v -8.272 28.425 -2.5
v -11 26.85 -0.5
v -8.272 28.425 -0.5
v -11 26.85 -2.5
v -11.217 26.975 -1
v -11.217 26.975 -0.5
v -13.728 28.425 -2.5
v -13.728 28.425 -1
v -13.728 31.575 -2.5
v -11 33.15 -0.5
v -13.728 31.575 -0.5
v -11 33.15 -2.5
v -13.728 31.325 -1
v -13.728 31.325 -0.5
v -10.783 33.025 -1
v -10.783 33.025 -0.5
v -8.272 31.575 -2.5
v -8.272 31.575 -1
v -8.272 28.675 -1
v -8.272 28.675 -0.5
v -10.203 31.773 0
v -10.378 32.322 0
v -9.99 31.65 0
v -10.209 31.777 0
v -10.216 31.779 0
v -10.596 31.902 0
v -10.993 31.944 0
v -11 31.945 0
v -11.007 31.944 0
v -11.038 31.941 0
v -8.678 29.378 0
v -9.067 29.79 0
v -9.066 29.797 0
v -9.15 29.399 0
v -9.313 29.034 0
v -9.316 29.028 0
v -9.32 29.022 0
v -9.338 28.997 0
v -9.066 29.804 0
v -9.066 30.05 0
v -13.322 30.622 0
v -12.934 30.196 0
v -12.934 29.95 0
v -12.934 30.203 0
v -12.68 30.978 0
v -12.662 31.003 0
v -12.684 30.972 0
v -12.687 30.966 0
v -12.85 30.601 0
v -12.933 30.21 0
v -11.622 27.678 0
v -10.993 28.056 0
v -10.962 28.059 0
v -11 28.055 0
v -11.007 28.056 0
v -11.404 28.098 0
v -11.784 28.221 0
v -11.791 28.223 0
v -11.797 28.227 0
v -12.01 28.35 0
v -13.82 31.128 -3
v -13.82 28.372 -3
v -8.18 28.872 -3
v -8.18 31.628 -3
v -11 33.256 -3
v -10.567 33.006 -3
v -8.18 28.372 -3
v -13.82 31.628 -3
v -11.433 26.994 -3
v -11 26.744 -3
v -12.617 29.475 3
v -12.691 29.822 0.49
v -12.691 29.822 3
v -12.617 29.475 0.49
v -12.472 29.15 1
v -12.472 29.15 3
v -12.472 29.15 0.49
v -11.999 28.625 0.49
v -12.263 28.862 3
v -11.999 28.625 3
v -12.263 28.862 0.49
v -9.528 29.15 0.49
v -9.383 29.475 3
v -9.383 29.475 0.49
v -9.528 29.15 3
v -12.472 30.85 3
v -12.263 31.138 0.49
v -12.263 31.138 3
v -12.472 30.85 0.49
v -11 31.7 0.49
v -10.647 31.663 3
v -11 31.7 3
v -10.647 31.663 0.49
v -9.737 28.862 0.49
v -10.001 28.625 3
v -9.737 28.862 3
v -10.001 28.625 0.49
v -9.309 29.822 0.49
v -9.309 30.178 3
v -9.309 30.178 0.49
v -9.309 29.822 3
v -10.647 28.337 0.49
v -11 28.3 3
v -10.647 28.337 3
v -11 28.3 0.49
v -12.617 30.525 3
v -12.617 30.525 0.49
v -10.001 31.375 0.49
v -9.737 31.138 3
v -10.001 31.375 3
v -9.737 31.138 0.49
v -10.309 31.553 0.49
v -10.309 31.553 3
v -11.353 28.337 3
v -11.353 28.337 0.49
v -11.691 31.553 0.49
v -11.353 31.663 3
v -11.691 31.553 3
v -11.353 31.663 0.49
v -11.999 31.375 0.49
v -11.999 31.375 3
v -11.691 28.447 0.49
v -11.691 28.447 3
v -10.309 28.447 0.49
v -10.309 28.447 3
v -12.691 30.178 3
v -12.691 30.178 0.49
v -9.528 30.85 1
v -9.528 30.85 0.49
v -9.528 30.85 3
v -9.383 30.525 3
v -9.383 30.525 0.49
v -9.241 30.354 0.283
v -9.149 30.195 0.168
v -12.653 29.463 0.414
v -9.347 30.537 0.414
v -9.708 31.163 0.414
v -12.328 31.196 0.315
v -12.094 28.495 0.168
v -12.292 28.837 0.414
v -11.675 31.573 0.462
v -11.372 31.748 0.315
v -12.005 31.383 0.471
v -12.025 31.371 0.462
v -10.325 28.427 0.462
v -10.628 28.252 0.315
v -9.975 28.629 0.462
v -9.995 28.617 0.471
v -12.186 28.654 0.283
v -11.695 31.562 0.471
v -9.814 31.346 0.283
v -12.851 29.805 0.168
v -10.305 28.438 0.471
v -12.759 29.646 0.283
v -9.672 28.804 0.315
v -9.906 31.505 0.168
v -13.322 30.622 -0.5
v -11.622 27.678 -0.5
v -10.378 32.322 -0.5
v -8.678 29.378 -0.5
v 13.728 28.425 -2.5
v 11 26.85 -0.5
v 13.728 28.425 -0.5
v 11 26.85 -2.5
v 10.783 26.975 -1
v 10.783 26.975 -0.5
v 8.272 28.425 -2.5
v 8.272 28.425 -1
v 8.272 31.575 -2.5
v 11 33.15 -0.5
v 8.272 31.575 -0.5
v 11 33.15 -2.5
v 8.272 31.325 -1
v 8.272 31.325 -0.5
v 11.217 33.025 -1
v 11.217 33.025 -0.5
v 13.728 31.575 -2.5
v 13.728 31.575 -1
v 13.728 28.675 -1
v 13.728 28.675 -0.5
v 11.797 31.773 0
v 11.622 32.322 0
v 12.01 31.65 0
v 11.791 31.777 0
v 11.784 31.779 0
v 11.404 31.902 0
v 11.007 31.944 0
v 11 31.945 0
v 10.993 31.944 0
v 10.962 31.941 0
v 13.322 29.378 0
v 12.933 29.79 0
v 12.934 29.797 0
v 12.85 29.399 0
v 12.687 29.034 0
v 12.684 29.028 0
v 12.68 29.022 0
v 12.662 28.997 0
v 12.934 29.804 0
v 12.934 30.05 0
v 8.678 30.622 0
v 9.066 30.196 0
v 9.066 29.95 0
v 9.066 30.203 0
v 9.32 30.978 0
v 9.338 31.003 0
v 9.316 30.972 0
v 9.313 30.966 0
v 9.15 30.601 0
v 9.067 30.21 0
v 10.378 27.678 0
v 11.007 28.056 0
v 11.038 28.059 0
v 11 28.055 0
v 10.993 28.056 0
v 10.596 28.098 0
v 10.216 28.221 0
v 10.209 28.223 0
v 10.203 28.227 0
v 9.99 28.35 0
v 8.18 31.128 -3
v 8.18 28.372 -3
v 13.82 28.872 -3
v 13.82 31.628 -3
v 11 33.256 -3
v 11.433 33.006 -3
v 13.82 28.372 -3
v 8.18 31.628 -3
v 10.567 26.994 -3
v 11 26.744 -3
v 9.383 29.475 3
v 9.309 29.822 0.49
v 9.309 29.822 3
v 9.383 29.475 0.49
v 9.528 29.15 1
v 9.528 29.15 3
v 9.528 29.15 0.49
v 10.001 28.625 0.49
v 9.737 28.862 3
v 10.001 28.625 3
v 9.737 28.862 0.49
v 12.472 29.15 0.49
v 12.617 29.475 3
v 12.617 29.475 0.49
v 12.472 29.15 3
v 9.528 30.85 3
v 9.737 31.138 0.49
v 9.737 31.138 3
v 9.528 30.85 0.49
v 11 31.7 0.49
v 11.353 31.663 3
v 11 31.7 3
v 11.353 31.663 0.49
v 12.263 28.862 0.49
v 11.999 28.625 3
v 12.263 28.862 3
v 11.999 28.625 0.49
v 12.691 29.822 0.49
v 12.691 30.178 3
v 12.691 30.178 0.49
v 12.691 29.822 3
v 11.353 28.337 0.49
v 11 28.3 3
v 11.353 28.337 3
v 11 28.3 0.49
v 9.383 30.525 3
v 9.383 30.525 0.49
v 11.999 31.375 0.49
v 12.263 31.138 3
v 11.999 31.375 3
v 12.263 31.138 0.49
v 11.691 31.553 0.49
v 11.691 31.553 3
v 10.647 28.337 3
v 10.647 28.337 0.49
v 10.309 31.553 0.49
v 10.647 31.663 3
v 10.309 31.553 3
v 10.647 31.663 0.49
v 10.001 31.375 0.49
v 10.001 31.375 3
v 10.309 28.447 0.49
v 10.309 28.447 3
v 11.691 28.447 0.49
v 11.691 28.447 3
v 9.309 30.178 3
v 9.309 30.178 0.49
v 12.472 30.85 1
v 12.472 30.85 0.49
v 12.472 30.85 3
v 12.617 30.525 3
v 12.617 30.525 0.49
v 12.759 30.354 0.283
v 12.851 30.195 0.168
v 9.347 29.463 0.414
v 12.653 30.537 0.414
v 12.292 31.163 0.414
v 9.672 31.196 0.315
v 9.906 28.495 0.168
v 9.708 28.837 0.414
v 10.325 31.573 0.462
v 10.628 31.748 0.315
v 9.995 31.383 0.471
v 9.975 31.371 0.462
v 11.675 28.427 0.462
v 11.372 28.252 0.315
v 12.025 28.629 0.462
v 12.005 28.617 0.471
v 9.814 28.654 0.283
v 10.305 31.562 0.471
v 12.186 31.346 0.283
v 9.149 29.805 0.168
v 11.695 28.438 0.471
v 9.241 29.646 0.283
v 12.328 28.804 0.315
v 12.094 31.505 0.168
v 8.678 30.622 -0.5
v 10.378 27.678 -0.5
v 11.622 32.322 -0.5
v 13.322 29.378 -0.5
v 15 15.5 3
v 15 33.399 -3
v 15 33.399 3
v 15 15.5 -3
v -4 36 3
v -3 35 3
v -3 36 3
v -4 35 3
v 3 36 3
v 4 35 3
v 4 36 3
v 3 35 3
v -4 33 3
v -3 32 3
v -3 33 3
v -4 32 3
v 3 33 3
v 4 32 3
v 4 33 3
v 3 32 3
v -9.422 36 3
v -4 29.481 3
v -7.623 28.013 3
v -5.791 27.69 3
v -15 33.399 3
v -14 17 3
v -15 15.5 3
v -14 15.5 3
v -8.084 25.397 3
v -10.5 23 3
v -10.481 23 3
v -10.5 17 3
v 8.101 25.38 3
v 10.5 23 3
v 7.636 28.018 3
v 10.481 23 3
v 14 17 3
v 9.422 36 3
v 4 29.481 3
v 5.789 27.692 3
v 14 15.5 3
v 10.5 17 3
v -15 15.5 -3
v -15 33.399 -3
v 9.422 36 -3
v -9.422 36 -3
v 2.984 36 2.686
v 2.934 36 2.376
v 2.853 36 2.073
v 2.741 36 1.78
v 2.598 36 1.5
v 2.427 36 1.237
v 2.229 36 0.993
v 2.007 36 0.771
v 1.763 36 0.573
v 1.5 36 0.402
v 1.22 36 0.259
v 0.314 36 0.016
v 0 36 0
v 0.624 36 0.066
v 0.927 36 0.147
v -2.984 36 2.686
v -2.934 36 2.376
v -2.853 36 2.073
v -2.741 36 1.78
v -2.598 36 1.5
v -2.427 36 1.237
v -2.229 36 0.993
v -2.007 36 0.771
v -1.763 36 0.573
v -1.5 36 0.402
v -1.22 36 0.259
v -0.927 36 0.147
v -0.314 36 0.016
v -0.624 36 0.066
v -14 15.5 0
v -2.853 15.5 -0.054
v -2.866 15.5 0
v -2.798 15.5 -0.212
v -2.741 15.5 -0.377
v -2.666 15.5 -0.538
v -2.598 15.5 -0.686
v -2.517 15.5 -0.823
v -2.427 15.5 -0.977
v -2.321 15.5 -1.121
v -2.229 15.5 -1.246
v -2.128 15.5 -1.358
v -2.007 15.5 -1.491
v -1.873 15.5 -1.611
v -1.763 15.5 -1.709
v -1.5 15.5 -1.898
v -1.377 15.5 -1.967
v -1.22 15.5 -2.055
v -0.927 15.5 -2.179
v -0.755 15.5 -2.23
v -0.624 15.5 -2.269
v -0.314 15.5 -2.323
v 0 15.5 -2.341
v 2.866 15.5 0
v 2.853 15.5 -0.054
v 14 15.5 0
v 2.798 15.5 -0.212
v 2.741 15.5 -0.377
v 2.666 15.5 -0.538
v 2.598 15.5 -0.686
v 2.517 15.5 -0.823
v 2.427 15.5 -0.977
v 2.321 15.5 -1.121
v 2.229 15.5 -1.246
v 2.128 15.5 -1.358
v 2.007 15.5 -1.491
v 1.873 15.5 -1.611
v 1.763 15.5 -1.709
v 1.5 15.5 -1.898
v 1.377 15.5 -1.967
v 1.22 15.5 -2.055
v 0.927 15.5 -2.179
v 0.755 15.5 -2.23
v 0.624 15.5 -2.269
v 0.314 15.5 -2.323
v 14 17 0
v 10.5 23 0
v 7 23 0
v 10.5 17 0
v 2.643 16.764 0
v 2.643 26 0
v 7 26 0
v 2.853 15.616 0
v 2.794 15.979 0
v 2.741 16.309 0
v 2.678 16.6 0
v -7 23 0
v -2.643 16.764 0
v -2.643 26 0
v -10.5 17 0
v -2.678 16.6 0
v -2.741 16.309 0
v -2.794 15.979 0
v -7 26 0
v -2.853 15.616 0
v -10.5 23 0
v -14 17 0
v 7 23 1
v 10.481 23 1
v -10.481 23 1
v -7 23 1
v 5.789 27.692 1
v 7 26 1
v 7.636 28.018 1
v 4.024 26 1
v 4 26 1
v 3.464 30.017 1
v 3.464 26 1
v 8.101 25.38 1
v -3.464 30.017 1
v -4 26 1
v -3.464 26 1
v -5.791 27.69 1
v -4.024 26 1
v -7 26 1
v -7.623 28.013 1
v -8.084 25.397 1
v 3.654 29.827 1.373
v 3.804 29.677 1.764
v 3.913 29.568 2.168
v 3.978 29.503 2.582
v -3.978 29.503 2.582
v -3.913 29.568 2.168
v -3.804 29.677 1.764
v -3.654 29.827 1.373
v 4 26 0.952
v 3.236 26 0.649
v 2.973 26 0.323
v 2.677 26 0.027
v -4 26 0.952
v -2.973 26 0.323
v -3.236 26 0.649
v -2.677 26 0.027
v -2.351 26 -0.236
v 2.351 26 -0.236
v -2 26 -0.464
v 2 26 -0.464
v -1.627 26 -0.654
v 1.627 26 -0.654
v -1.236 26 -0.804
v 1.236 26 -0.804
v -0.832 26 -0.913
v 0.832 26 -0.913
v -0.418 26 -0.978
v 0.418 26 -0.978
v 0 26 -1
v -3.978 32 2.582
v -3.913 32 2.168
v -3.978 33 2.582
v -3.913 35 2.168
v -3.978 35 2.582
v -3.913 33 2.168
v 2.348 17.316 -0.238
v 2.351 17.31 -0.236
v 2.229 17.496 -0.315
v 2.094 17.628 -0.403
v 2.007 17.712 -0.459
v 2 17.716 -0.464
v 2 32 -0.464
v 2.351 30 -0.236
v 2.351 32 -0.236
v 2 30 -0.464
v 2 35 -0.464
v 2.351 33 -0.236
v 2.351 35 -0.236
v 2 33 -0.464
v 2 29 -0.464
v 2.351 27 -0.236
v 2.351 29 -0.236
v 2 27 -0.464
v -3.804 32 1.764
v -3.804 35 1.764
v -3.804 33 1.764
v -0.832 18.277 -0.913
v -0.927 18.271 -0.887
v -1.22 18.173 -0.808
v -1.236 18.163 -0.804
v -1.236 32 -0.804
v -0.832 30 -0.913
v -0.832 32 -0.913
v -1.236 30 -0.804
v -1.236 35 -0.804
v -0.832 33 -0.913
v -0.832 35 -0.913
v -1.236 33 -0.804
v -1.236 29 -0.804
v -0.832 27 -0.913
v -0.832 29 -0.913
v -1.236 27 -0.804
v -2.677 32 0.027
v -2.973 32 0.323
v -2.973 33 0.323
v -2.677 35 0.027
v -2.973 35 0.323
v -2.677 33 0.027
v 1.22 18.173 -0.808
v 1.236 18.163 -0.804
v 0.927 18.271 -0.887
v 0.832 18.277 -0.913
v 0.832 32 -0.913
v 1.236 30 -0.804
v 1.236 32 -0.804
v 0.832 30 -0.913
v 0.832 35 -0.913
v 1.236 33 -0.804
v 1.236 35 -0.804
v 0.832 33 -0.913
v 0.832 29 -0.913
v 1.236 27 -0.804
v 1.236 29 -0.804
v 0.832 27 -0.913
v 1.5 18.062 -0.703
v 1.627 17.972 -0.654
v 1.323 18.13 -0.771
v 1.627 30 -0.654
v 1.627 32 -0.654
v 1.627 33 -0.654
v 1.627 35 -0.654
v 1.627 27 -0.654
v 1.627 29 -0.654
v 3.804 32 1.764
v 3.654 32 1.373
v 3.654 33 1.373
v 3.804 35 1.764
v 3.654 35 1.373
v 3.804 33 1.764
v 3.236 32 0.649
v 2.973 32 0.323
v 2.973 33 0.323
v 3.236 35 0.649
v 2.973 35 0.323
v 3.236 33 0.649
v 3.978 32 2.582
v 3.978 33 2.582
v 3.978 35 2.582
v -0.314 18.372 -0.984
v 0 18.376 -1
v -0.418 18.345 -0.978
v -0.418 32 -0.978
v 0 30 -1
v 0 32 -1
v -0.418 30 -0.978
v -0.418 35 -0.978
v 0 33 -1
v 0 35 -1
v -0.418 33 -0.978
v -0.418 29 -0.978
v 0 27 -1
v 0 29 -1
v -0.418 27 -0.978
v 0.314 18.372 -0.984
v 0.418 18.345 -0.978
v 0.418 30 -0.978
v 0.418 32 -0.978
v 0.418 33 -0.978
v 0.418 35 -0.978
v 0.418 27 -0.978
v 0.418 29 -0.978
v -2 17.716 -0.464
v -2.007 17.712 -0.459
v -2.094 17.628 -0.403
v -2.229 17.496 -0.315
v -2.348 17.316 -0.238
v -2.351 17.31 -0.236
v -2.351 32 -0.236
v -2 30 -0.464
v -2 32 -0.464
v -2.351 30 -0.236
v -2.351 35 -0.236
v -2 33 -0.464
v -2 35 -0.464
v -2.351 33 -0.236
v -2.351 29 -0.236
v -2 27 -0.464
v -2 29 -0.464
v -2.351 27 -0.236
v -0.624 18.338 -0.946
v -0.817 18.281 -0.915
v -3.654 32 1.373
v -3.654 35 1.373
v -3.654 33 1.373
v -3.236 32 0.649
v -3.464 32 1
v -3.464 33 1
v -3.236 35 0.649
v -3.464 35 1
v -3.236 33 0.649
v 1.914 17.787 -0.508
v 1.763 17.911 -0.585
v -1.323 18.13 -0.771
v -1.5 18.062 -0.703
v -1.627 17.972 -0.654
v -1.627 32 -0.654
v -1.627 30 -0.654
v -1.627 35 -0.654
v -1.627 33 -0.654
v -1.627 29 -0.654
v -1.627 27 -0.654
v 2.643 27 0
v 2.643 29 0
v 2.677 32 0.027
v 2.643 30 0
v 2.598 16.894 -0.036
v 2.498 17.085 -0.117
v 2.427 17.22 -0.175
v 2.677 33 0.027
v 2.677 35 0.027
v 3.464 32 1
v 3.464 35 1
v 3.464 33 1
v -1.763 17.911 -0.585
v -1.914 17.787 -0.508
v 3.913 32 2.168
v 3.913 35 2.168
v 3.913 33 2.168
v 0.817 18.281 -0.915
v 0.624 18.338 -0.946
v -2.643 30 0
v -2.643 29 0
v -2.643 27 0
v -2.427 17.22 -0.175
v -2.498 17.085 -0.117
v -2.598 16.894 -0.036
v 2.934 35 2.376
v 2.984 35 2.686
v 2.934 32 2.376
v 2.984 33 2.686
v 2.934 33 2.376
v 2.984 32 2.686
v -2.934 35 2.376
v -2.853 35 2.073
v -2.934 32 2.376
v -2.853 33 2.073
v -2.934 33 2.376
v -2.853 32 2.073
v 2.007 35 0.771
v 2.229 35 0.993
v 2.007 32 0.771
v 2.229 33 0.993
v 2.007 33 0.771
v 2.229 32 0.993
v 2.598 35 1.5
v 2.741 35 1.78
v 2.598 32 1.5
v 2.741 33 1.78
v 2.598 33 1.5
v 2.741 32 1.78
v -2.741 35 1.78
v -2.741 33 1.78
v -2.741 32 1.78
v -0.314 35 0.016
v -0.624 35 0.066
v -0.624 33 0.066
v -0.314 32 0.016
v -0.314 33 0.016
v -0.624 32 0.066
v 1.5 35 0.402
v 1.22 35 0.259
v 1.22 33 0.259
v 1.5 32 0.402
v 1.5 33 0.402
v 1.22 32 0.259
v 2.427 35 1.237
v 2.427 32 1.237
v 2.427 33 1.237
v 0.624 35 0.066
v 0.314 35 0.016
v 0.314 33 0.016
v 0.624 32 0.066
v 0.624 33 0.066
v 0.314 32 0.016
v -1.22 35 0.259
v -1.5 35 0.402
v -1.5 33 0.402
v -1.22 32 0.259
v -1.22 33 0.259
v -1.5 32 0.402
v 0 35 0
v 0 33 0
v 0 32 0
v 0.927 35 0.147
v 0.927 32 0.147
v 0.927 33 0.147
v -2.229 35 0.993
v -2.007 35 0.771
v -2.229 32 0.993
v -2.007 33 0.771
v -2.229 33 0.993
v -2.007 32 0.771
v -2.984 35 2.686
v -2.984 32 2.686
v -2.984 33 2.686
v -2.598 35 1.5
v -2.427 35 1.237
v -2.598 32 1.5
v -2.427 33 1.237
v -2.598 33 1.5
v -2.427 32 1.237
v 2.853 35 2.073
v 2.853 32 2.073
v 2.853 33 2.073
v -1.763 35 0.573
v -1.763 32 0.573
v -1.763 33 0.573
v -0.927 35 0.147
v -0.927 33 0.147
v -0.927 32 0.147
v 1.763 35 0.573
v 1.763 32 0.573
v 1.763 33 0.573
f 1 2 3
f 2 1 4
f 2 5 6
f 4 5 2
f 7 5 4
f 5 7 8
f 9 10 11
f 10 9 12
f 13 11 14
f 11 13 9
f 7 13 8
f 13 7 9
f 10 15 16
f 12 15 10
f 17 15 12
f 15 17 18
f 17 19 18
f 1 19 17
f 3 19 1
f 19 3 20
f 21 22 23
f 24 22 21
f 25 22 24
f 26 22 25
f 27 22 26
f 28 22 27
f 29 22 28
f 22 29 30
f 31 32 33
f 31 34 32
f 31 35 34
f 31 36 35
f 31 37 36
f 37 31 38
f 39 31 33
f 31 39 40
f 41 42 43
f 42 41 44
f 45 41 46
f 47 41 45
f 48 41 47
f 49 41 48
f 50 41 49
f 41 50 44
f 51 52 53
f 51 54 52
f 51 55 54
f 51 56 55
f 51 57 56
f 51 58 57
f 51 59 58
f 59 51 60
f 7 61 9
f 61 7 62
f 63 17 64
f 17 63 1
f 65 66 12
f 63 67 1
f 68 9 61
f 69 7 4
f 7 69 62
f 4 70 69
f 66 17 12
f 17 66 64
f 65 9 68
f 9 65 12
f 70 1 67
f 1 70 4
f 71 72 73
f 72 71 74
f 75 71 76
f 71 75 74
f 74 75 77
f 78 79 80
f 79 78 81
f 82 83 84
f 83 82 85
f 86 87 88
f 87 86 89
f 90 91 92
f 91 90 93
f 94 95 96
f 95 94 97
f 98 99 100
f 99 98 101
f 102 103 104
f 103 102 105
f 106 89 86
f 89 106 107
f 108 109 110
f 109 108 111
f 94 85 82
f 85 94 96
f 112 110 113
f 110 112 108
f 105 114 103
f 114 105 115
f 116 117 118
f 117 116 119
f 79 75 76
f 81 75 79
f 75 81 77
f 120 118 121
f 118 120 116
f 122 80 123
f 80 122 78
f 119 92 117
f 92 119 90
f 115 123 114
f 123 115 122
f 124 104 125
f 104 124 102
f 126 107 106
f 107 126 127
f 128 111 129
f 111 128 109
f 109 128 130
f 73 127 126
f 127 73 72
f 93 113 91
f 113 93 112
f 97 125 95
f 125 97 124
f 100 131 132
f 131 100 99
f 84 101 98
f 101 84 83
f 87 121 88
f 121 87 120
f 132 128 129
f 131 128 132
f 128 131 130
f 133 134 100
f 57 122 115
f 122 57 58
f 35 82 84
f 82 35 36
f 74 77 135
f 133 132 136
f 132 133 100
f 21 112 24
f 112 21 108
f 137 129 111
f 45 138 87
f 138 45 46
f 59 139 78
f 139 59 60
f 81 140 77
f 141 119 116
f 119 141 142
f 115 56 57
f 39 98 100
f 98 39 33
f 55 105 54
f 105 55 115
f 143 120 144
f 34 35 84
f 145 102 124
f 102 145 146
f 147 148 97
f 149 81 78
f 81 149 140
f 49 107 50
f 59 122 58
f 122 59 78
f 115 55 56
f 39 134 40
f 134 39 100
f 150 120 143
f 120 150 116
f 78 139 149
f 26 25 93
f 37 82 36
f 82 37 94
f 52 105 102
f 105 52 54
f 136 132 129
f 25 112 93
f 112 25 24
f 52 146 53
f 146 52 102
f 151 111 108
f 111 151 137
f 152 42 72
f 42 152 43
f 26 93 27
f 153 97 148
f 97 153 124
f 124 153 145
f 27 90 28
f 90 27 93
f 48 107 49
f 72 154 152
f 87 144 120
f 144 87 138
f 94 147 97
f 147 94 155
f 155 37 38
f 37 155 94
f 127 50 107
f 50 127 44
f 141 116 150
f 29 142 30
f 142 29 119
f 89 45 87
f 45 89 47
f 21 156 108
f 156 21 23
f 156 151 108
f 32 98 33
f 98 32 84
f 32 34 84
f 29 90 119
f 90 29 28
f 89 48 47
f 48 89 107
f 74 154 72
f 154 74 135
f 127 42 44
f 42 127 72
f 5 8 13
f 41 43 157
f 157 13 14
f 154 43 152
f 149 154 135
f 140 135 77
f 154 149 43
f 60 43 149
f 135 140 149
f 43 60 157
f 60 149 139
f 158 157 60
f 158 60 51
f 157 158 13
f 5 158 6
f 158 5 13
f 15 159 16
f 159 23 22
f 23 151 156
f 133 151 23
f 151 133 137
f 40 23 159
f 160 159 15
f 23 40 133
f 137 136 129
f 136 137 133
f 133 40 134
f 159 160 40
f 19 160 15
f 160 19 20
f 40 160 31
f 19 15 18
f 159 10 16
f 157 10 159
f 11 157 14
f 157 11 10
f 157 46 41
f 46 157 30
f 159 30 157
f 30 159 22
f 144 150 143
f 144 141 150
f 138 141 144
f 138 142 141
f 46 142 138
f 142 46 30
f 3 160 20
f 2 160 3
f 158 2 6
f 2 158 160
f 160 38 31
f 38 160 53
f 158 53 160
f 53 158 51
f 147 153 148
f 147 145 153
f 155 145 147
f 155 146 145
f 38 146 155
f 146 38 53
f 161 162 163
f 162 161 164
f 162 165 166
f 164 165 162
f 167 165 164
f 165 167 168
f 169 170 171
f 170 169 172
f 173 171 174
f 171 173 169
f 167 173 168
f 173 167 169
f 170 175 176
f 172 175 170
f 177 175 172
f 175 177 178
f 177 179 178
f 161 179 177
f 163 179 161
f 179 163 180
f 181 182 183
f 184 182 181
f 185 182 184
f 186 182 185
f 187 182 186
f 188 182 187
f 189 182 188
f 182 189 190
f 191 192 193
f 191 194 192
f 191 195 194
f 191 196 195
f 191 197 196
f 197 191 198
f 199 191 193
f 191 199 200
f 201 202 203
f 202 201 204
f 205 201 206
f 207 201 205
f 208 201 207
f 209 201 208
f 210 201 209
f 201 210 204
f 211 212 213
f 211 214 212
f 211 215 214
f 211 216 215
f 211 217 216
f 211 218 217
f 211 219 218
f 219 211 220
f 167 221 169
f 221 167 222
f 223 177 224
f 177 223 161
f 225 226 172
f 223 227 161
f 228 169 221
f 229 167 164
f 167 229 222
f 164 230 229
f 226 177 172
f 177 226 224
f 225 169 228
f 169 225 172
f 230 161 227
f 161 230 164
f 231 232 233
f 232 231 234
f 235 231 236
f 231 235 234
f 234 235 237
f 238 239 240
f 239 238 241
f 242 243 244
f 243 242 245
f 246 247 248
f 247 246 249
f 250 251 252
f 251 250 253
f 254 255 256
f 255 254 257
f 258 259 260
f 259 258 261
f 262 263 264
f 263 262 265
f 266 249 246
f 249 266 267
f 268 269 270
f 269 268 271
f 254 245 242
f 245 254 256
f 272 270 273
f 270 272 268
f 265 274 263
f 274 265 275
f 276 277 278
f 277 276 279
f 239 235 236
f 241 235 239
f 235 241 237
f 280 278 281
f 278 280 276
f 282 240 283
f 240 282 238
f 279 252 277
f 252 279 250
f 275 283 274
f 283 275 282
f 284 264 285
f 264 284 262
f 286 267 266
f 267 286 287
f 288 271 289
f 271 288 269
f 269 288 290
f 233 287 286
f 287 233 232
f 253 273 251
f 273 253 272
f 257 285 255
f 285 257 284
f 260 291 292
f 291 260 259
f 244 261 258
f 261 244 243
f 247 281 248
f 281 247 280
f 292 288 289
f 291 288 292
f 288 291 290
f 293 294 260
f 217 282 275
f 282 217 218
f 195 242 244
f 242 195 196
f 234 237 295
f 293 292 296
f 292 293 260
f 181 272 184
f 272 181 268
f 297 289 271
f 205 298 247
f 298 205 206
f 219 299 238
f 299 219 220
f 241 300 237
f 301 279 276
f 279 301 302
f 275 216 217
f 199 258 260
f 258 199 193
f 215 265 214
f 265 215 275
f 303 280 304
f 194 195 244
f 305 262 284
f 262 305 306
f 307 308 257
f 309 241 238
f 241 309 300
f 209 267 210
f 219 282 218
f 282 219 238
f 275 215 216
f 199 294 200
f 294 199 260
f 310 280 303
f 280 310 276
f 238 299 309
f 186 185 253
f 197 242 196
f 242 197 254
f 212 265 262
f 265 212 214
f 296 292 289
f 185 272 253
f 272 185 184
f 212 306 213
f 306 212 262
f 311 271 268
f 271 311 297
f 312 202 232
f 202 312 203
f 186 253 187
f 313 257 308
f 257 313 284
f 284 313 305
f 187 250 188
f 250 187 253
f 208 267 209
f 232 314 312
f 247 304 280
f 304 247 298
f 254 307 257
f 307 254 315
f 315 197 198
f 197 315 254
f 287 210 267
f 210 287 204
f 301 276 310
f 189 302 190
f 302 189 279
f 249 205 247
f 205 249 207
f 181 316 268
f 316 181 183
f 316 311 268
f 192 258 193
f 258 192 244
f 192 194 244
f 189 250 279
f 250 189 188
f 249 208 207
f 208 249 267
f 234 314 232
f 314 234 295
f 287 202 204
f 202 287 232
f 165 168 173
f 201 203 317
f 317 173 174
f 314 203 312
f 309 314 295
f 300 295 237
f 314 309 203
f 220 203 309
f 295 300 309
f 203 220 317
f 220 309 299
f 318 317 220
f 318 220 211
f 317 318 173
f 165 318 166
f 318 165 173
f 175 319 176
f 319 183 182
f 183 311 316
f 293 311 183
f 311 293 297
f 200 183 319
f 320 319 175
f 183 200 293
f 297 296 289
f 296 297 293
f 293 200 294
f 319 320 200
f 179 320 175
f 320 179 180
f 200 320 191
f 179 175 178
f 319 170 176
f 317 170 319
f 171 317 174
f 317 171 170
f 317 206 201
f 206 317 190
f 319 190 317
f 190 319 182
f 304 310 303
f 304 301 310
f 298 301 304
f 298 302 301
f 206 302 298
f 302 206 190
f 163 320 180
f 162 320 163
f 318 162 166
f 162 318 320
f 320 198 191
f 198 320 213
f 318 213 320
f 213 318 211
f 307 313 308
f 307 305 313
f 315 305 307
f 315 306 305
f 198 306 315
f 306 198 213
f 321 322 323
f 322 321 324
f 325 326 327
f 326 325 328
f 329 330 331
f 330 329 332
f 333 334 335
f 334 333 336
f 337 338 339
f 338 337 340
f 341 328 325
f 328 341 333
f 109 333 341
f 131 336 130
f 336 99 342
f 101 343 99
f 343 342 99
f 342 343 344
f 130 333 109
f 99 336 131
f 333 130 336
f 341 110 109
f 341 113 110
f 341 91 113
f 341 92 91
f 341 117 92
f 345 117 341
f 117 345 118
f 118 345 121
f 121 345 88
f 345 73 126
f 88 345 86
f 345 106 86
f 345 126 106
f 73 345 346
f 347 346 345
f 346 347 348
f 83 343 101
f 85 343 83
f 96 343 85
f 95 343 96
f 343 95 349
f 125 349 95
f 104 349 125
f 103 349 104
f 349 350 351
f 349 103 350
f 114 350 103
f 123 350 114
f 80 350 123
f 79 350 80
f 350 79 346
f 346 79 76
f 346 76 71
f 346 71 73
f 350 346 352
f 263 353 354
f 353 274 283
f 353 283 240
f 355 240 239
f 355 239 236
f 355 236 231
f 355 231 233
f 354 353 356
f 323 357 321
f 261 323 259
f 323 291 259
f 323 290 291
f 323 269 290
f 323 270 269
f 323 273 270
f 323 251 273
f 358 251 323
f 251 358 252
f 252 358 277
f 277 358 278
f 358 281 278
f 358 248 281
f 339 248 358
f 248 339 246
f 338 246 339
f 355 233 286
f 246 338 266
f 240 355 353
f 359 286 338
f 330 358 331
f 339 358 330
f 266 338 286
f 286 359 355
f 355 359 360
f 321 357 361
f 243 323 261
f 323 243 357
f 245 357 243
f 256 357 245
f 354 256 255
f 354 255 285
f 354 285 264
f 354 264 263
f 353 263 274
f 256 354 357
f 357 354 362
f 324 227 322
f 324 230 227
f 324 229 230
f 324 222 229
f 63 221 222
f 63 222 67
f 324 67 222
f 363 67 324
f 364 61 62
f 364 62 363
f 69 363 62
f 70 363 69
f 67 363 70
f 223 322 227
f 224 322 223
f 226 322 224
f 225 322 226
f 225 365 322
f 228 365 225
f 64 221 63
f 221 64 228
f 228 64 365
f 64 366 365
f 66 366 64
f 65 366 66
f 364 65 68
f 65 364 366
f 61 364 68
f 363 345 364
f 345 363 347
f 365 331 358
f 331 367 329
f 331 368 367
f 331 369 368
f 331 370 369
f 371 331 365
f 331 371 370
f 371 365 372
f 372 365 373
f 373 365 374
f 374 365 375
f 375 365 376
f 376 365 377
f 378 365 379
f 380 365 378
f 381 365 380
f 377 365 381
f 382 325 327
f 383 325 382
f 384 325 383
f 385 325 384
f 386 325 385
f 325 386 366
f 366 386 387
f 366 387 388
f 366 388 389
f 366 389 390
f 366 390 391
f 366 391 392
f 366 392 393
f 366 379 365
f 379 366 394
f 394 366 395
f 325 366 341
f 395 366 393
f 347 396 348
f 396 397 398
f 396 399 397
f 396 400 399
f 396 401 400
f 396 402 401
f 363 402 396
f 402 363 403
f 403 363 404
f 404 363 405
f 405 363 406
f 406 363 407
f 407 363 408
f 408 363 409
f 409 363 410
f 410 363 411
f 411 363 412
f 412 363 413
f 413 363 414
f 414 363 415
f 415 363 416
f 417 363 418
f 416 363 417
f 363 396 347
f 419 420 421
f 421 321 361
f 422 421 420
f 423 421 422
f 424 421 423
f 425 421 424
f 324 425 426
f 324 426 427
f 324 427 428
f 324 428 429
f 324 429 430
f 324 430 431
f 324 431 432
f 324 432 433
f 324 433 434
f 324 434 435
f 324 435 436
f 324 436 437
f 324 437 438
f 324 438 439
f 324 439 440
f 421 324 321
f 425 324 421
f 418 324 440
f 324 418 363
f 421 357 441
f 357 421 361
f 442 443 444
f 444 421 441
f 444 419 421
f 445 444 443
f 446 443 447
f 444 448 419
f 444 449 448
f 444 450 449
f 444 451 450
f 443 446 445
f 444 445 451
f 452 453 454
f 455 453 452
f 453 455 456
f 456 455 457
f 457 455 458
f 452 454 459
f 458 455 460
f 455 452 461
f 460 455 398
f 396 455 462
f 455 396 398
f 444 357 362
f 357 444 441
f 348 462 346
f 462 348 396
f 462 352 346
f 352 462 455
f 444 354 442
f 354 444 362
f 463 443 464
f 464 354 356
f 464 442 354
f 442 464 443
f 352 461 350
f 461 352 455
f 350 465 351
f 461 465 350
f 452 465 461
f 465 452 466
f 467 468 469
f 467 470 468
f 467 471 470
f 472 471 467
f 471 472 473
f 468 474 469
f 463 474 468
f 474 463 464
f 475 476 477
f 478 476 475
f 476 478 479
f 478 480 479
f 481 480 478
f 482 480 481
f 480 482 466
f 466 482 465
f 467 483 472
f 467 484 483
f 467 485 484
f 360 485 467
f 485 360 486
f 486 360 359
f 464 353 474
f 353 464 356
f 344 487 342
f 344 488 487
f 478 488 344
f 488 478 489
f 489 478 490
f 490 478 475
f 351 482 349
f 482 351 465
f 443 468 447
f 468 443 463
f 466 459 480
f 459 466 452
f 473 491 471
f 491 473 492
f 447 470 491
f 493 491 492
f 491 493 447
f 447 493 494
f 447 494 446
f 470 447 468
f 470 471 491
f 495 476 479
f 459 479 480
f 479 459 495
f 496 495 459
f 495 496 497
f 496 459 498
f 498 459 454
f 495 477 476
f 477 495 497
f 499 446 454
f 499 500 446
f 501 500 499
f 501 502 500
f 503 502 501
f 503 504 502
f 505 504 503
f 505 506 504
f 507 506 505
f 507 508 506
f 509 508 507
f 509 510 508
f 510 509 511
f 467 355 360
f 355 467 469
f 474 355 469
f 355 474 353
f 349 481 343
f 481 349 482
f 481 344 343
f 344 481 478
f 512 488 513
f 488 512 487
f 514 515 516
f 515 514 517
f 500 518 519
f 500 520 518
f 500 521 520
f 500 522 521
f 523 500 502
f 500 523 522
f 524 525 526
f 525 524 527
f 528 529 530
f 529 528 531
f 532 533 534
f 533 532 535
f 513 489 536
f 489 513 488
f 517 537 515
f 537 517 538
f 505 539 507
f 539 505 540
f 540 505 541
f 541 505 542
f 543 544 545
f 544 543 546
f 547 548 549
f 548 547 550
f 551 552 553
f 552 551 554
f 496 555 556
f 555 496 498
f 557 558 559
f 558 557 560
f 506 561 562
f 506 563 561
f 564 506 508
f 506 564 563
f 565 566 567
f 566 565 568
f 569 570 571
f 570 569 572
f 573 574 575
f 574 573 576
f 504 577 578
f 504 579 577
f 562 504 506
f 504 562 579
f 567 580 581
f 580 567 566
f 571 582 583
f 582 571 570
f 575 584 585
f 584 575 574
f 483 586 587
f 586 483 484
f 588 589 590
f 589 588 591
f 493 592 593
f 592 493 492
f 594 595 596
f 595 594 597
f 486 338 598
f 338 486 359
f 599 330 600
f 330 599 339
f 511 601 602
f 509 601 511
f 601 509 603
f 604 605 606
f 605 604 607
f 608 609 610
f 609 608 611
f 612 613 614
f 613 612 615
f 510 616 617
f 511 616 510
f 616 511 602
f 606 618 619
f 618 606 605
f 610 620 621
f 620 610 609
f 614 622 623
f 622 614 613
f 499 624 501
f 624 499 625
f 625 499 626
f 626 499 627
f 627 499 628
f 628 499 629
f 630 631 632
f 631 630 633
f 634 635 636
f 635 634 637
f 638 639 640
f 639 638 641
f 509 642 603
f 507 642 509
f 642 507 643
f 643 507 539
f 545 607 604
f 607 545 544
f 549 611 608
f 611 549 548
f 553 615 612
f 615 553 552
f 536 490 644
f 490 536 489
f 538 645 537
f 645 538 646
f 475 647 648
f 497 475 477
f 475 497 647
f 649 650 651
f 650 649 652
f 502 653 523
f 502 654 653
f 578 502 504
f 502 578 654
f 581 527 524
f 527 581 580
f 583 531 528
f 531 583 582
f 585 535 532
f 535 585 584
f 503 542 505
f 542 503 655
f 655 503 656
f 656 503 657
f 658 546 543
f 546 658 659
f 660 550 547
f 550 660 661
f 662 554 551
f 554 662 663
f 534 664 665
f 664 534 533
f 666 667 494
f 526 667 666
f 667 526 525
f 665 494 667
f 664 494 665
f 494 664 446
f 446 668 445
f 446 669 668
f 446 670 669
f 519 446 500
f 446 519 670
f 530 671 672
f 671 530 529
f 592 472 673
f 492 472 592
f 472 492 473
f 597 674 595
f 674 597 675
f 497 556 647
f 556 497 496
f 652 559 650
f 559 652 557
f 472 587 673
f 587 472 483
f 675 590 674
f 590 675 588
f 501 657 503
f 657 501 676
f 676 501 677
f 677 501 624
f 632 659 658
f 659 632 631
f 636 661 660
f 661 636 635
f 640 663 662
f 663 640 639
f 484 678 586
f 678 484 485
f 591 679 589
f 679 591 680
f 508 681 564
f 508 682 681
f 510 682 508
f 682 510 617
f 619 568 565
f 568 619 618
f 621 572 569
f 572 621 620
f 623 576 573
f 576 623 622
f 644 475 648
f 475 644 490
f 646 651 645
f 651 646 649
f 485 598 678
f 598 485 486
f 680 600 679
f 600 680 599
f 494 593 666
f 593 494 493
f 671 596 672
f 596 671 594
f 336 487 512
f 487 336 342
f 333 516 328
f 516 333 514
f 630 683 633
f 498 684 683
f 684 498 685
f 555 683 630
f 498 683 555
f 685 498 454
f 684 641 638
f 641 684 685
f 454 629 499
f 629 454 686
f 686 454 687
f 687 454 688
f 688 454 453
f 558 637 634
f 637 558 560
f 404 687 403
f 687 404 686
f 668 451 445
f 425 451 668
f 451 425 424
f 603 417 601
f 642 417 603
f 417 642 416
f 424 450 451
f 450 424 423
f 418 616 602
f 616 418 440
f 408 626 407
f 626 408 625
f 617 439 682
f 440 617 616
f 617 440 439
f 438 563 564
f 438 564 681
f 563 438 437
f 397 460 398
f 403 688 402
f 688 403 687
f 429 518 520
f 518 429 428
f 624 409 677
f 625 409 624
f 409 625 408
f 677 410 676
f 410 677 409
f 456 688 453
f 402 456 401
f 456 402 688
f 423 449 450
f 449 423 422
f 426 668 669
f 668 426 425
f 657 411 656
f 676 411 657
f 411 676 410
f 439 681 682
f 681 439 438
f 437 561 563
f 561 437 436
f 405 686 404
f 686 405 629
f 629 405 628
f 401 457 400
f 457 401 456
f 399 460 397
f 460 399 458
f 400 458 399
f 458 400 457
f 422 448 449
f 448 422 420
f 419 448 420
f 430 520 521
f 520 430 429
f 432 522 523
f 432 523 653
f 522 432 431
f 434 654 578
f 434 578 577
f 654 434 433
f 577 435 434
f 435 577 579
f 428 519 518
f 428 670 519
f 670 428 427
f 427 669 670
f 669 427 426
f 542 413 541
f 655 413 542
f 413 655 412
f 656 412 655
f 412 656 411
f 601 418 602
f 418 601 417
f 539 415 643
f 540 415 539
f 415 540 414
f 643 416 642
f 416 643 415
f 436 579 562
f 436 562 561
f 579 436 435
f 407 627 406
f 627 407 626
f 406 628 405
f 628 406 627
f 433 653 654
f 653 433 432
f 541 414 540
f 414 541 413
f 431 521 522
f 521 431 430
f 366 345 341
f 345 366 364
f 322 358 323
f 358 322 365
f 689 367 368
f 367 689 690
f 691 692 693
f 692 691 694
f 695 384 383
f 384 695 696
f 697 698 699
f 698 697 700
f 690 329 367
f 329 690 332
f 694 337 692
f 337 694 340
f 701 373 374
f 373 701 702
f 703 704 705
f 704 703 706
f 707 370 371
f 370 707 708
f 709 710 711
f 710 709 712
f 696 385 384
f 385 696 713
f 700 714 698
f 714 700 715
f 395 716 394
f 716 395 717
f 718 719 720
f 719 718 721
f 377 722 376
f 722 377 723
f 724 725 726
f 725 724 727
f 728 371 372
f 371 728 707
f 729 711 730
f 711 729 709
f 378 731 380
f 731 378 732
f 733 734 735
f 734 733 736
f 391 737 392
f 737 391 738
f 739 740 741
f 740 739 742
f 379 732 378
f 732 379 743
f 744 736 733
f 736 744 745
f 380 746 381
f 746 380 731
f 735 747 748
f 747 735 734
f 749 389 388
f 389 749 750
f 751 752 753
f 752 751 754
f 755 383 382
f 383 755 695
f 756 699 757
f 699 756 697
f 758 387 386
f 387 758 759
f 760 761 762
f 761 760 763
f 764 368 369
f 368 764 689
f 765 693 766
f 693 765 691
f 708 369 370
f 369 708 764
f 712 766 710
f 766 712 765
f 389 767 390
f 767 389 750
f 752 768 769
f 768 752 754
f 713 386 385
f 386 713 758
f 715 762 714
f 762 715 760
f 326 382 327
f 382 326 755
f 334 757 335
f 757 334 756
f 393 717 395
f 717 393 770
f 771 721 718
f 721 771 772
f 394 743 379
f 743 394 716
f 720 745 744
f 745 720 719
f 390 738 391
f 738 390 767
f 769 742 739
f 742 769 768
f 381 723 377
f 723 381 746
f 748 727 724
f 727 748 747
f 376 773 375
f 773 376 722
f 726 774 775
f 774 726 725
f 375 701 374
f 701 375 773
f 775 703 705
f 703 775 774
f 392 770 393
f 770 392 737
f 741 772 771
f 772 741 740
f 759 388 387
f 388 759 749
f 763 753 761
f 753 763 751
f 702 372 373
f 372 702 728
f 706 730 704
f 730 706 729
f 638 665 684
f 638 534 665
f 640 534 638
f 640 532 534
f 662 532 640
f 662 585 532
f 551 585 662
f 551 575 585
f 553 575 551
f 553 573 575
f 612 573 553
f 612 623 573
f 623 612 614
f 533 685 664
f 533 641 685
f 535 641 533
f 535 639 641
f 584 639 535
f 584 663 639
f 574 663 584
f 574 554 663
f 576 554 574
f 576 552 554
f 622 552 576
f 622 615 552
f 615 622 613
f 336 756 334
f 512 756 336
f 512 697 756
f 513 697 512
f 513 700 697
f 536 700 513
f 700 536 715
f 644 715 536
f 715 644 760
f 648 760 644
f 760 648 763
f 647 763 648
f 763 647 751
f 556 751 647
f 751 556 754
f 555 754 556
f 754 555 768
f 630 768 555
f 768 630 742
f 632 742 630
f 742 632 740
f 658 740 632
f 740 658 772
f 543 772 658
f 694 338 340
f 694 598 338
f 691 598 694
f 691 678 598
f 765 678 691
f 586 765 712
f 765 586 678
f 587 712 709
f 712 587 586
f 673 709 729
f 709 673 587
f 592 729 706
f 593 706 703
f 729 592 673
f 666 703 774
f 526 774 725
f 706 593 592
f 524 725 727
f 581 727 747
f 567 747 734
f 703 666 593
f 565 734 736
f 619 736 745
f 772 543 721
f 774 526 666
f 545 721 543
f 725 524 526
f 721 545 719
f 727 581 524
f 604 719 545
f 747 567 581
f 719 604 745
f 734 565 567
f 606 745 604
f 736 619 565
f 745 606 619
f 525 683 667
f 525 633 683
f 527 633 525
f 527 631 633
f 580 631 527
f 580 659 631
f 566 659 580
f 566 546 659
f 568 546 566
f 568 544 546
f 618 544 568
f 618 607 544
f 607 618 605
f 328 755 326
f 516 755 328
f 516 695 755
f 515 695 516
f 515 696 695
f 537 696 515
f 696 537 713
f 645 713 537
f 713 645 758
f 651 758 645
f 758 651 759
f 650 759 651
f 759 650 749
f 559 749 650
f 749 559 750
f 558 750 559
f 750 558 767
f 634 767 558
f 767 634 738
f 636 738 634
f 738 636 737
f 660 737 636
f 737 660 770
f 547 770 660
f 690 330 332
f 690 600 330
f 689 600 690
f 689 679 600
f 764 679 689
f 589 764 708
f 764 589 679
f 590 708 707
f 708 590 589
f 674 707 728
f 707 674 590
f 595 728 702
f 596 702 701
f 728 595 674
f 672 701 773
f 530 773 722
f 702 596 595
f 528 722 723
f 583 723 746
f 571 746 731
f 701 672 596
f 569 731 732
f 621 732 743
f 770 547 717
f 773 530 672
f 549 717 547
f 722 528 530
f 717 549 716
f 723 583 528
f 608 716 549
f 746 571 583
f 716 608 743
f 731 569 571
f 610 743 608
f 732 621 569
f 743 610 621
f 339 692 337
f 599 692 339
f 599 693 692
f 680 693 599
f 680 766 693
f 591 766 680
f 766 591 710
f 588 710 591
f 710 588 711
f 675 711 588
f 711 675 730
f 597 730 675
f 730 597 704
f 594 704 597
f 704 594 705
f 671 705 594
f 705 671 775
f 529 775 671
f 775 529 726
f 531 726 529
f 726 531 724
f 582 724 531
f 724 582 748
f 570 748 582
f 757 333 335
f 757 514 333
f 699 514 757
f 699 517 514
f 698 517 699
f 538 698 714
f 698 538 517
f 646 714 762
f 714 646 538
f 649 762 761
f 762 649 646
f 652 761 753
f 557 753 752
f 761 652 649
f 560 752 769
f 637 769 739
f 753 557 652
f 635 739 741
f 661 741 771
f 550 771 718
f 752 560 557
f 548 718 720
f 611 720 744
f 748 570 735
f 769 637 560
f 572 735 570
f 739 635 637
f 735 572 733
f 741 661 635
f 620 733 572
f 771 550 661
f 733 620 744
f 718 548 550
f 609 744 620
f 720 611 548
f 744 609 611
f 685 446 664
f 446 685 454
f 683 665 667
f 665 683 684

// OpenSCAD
// PRUSA iteration4
// Heatbed cable cover clip MK3S
// GNU GPL v3
// Josef Průša <iam@josefprusa.cz> and contributors
// http://www.reprap.org/wiki/Prusa_Mendel
// http://prusamendel.org

module m3_nut() {
  difference() {
    union() {
      cylinder(h=4, r=3.15, $fn=6);
      translate([0, 0, 2.5]) cylinder(h=4, r1=3.15, r2=4, $fn=6);
      translate([0, 0, -9]) cylinder(h=12, r=1.7, $fn=30);
      translate([0, 0, -0.49]) cylinder(h=0.5, r1=1.7, r2=1.95, $fn=30);
    }
    translate([1.7, -5, -1]) cube([5, 10, 2]);
    translate([-6.7, -5, -1]) cube([5, 10, 2]);

    translate([-5, 1.7, -1.5]) cube([10, 5, 2]);
    translate([-5, -6.7, -1.5]) cube([10, 5, 2]);
  }
}

module clip() {

  difference() {
    // base body
    translate([-15, 15.5, -3]) cube([30, 20.5, 6]);

    // inner angled cut
    translate([3.5, 2, 0]) rotate([0, 0, 0]) cube([10.5, 15, 6]);
    translate([-14, 2, 0]) rotate([0, 0, 0]) cube([10.5, 15, 6]);

    translate([3.5, 15, 0]) rotate([0, 0, 0]) cube([7, 8, 6]);
    translate([-10.5, 15, 0]) rotate([0, 0, 0]) cube([7, 8, 6]);

    translate([6.96, 19.45, 1]) rotate([0, 0, 45]) cube([5, 10, 6]);
    translate([-6.96, 19.45, 1]) rotate([0, 0, 45]) cube([10, 5, 6]);

    translate([-0, 37, 3]) rotate([90, 0, 0]) cylinder(h=17, r=3.5, $fn=60);

    translate([-7, 15, 0]) rotate([0, 0, 0]) cube([14, 11, 6]);

    translate([3, 14, 1]) rotate([0, 0, 10]) cube([7, 13, 6]);
    translate([-9.88, 15.21, 1]) rotate([0, 0, -10]) cube([7, 13, 6]);

    // cables cut
    translate([-0, 36, 3]) rotate([90, 0, 0]) cylinder(h=187, r=4, $fn=60);

    translate([-11, 30, 0]) rotate([0, 180, 30]) m3_nut();
    translate([11, 30, 0]) rotate([0, 180, 30]) m3_nut();

    // thermistor cable entry
    translate([-0, 22, 4]) rotate([115, 0, 0]) cylinder(h=15, r=3, $fn=60);

    // edges
    translate([-18.0, 32, -5]) rotate([0, 0, 25]) cube([11, 11, 15]);
    translate([18, 32, -5]) rotate([0, 0, 65]) cube([11, 11, 15]);
  }

  // cable rims
  difference() {
    difference() {
      translate([-0, 36, 3]) rotate([90, 0, 0]) cylinder(h=10, r=4.5, $fn=60);
      translate([-0, 37, 3]) rotate([90, 0, 0]) cylinder(h=17, r=3, $fn=60);
    }
    translate([-15, 18, 3]) cube([30, 20, 6]);
    translate([-15, 27, -5]) cube([30, 2, 16]);
    translate([-15, 30, -5]) cube([30, 2, 16]);
    translate([-15, 33, -5]) cube([30, 2, 16]);
    translate([6.96, 19.45, 1]) rotate([0, 0, 45]) cube([5, 10, 6]);
    translate([-6.96, 19.45, 1]) rotate([0, 0, 45]) cube([10, 5, 6]);
    translate([-4, 20, 0]) rotate([0, 0, 0]) cube([8, 11, 6]);
  }
}

clip();
